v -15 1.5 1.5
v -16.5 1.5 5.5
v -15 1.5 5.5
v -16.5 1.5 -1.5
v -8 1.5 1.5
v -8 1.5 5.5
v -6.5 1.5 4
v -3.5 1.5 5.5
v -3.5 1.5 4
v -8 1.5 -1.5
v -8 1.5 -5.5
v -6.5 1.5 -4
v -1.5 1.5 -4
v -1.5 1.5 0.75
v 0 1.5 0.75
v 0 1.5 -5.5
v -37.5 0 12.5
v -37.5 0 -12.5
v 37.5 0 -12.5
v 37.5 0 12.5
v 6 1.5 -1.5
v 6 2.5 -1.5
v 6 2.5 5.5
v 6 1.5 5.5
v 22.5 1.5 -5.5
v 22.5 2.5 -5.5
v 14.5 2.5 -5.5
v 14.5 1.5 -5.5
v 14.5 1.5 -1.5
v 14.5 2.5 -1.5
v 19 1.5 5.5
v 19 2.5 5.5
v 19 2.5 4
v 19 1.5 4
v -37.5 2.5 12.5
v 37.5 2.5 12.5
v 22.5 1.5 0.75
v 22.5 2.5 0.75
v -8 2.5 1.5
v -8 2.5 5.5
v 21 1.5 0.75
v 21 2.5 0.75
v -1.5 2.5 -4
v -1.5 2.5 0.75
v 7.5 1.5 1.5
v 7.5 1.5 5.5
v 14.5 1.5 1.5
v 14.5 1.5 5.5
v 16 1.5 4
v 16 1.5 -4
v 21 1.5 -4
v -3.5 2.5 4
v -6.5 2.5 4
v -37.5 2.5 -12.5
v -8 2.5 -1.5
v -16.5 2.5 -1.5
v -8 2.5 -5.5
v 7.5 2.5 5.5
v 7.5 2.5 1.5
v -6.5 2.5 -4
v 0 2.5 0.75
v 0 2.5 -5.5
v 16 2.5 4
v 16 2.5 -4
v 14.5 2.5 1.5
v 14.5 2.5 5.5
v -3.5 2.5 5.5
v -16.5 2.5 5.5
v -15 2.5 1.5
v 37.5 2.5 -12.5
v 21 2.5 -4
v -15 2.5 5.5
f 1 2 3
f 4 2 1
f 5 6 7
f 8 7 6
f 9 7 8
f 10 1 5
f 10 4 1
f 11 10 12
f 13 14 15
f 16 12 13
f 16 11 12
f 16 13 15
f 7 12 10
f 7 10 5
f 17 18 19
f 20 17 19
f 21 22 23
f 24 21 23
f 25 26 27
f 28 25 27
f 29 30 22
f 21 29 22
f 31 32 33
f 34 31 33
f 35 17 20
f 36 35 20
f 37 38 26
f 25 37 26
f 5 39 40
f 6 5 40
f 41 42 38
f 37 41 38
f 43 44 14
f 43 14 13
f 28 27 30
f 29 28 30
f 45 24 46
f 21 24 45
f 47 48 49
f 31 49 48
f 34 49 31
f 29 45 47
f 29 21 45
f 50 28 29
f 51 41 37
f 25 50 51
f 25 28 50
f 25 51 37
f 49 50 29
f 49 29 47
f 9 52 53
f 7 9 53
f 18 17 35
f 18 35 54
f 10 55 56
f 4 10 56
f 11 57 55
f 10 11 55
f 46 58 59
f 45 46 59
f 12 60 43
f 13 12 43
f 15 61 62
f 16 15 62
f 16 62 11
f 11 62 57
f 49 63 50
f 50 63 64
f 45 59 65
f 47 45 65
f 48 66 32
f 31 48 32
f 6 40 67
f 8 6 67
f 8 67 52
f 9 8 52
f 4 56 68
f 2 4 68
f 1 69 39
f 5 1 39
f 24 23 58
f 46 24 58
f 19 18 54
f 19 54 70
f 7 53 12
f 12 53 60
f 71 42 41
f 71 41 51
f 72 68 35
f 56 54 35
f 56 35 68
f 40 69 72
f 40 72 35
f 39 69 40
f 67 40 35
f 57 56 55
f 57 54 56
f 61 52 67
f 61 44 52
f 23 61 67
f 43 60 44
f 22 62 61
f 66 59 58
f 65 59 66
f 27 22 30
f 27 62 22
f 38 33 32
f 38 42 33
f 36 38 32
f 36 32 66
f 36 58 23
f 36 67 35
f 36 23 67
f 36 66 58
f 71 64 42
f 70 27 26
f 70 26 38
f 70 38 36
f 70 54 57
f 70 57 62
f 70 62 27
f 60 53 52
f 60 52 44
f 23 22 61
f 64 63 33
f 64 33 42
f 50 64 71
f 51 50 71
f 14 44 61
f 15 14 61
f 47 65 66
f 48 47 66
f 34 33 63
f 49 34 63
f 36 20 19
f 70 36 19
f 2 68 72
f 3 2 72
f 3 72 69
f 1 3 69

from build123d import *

# Parameters (mm, degrees)
SKETCH1_W           = 75
SKETCH1_H           = 25
BOSS_EXTRUDE1_DEPTH = 2.5
SKETCH2_W           = 1.5
SKETCH2_H           = 4
SKETCH2_H_2         = 2.5
SKETCH2_H_3         = 4.75
CUT_EXTRUDE1_DEPTH  = 1


with BuildPart() as part:
    # Sketch1 → Boss-Extrude1 (new body)
    with BuildSketch(Plane(origin=(0, 0, 0), x_dir=(1, 0, 0), z_dir=(0, 1, 0))):
        Rectangle(SKETCH1_W, SKETCH1_H)
    extrude(amount=BOSS_EXTRUDE1_DEPTH)

    # Sketch2 → Cut-Extrude1 (cut)
    with BuildSketch(Plane(origin=(0, 2.5, 0), x_dir=(1, 0, 0), z_dir=(0, 1, 0))):
        Polygon((6, 1.5), (6, -1.5), (7.5, -1.5), (14.5, -1.5), (16, -1.5), (16, -1), (16, 0), (16, 1.5), (14.5, 1.5), align=None)
        with Locations((6.75, -3.5)):
            Rectangle(SKETCH2_W, SKETCH2_H)
        with Locations((15.25, -2.75)):
            Rectangle(SKETCH2_W, SKETCH2_H_2)
        with Locations((15.25, 2.75)):
            Rectangle(SKETCH2_W, SKETCH2_H_2)
        Polygon((16, -4), (14.5, -4), (14.5, -5.5), (19, -5.5), (19, -4), align=None)
        Polygon((14.5, 5.5), (14.5, 4), (16, 4), (21, 4), (22.5, 4), (22.5, 5.5), align=None)
        with Locations((21.75, 1.625)):
            Rectangle(SKETCH2_W, SKETCH2_H_3)
        Polygon((-16.5, 1.5), (-16.5, -1.5), (-15, -1.5), (-8, -1.5), (-6.5, -1.5), (-6.5, -1), (-6.5, 0), (-6.5, 1.5), (-8, 1.5), align=None)
        with Locations((-15.75, -3.5)):
            Rectangle(SKETCH2_W, SKETCH2_H)
        with Locations((-7.25, -2.75)):
            Rectangle(SKETCH2_W, SKETCH2_H_2)
        with Locations((-7.25, 2.75)):
            Rectangle(SKETCH2_W, SKETCH2_H_2)
        Polygon((-6.5, -4), (-8, -4), (-8, -5.5), (-3.5, -5.5), (-3.5, -4), align=None)
        Polygon((-8, 5.5), (-8, 4), (-6.5, 4), (-1.5, 4), (0, 4), (0, 5.5), align=None)
        with Locations((-0.75, 1.625)):
            Rectangle(SKETCH2_W, SKETCH2_H_3)
    extrude(amount=-CUT_EXTRUDE1_DEPTH, mode=Mode.SUBTRACT)


solid = part.part
